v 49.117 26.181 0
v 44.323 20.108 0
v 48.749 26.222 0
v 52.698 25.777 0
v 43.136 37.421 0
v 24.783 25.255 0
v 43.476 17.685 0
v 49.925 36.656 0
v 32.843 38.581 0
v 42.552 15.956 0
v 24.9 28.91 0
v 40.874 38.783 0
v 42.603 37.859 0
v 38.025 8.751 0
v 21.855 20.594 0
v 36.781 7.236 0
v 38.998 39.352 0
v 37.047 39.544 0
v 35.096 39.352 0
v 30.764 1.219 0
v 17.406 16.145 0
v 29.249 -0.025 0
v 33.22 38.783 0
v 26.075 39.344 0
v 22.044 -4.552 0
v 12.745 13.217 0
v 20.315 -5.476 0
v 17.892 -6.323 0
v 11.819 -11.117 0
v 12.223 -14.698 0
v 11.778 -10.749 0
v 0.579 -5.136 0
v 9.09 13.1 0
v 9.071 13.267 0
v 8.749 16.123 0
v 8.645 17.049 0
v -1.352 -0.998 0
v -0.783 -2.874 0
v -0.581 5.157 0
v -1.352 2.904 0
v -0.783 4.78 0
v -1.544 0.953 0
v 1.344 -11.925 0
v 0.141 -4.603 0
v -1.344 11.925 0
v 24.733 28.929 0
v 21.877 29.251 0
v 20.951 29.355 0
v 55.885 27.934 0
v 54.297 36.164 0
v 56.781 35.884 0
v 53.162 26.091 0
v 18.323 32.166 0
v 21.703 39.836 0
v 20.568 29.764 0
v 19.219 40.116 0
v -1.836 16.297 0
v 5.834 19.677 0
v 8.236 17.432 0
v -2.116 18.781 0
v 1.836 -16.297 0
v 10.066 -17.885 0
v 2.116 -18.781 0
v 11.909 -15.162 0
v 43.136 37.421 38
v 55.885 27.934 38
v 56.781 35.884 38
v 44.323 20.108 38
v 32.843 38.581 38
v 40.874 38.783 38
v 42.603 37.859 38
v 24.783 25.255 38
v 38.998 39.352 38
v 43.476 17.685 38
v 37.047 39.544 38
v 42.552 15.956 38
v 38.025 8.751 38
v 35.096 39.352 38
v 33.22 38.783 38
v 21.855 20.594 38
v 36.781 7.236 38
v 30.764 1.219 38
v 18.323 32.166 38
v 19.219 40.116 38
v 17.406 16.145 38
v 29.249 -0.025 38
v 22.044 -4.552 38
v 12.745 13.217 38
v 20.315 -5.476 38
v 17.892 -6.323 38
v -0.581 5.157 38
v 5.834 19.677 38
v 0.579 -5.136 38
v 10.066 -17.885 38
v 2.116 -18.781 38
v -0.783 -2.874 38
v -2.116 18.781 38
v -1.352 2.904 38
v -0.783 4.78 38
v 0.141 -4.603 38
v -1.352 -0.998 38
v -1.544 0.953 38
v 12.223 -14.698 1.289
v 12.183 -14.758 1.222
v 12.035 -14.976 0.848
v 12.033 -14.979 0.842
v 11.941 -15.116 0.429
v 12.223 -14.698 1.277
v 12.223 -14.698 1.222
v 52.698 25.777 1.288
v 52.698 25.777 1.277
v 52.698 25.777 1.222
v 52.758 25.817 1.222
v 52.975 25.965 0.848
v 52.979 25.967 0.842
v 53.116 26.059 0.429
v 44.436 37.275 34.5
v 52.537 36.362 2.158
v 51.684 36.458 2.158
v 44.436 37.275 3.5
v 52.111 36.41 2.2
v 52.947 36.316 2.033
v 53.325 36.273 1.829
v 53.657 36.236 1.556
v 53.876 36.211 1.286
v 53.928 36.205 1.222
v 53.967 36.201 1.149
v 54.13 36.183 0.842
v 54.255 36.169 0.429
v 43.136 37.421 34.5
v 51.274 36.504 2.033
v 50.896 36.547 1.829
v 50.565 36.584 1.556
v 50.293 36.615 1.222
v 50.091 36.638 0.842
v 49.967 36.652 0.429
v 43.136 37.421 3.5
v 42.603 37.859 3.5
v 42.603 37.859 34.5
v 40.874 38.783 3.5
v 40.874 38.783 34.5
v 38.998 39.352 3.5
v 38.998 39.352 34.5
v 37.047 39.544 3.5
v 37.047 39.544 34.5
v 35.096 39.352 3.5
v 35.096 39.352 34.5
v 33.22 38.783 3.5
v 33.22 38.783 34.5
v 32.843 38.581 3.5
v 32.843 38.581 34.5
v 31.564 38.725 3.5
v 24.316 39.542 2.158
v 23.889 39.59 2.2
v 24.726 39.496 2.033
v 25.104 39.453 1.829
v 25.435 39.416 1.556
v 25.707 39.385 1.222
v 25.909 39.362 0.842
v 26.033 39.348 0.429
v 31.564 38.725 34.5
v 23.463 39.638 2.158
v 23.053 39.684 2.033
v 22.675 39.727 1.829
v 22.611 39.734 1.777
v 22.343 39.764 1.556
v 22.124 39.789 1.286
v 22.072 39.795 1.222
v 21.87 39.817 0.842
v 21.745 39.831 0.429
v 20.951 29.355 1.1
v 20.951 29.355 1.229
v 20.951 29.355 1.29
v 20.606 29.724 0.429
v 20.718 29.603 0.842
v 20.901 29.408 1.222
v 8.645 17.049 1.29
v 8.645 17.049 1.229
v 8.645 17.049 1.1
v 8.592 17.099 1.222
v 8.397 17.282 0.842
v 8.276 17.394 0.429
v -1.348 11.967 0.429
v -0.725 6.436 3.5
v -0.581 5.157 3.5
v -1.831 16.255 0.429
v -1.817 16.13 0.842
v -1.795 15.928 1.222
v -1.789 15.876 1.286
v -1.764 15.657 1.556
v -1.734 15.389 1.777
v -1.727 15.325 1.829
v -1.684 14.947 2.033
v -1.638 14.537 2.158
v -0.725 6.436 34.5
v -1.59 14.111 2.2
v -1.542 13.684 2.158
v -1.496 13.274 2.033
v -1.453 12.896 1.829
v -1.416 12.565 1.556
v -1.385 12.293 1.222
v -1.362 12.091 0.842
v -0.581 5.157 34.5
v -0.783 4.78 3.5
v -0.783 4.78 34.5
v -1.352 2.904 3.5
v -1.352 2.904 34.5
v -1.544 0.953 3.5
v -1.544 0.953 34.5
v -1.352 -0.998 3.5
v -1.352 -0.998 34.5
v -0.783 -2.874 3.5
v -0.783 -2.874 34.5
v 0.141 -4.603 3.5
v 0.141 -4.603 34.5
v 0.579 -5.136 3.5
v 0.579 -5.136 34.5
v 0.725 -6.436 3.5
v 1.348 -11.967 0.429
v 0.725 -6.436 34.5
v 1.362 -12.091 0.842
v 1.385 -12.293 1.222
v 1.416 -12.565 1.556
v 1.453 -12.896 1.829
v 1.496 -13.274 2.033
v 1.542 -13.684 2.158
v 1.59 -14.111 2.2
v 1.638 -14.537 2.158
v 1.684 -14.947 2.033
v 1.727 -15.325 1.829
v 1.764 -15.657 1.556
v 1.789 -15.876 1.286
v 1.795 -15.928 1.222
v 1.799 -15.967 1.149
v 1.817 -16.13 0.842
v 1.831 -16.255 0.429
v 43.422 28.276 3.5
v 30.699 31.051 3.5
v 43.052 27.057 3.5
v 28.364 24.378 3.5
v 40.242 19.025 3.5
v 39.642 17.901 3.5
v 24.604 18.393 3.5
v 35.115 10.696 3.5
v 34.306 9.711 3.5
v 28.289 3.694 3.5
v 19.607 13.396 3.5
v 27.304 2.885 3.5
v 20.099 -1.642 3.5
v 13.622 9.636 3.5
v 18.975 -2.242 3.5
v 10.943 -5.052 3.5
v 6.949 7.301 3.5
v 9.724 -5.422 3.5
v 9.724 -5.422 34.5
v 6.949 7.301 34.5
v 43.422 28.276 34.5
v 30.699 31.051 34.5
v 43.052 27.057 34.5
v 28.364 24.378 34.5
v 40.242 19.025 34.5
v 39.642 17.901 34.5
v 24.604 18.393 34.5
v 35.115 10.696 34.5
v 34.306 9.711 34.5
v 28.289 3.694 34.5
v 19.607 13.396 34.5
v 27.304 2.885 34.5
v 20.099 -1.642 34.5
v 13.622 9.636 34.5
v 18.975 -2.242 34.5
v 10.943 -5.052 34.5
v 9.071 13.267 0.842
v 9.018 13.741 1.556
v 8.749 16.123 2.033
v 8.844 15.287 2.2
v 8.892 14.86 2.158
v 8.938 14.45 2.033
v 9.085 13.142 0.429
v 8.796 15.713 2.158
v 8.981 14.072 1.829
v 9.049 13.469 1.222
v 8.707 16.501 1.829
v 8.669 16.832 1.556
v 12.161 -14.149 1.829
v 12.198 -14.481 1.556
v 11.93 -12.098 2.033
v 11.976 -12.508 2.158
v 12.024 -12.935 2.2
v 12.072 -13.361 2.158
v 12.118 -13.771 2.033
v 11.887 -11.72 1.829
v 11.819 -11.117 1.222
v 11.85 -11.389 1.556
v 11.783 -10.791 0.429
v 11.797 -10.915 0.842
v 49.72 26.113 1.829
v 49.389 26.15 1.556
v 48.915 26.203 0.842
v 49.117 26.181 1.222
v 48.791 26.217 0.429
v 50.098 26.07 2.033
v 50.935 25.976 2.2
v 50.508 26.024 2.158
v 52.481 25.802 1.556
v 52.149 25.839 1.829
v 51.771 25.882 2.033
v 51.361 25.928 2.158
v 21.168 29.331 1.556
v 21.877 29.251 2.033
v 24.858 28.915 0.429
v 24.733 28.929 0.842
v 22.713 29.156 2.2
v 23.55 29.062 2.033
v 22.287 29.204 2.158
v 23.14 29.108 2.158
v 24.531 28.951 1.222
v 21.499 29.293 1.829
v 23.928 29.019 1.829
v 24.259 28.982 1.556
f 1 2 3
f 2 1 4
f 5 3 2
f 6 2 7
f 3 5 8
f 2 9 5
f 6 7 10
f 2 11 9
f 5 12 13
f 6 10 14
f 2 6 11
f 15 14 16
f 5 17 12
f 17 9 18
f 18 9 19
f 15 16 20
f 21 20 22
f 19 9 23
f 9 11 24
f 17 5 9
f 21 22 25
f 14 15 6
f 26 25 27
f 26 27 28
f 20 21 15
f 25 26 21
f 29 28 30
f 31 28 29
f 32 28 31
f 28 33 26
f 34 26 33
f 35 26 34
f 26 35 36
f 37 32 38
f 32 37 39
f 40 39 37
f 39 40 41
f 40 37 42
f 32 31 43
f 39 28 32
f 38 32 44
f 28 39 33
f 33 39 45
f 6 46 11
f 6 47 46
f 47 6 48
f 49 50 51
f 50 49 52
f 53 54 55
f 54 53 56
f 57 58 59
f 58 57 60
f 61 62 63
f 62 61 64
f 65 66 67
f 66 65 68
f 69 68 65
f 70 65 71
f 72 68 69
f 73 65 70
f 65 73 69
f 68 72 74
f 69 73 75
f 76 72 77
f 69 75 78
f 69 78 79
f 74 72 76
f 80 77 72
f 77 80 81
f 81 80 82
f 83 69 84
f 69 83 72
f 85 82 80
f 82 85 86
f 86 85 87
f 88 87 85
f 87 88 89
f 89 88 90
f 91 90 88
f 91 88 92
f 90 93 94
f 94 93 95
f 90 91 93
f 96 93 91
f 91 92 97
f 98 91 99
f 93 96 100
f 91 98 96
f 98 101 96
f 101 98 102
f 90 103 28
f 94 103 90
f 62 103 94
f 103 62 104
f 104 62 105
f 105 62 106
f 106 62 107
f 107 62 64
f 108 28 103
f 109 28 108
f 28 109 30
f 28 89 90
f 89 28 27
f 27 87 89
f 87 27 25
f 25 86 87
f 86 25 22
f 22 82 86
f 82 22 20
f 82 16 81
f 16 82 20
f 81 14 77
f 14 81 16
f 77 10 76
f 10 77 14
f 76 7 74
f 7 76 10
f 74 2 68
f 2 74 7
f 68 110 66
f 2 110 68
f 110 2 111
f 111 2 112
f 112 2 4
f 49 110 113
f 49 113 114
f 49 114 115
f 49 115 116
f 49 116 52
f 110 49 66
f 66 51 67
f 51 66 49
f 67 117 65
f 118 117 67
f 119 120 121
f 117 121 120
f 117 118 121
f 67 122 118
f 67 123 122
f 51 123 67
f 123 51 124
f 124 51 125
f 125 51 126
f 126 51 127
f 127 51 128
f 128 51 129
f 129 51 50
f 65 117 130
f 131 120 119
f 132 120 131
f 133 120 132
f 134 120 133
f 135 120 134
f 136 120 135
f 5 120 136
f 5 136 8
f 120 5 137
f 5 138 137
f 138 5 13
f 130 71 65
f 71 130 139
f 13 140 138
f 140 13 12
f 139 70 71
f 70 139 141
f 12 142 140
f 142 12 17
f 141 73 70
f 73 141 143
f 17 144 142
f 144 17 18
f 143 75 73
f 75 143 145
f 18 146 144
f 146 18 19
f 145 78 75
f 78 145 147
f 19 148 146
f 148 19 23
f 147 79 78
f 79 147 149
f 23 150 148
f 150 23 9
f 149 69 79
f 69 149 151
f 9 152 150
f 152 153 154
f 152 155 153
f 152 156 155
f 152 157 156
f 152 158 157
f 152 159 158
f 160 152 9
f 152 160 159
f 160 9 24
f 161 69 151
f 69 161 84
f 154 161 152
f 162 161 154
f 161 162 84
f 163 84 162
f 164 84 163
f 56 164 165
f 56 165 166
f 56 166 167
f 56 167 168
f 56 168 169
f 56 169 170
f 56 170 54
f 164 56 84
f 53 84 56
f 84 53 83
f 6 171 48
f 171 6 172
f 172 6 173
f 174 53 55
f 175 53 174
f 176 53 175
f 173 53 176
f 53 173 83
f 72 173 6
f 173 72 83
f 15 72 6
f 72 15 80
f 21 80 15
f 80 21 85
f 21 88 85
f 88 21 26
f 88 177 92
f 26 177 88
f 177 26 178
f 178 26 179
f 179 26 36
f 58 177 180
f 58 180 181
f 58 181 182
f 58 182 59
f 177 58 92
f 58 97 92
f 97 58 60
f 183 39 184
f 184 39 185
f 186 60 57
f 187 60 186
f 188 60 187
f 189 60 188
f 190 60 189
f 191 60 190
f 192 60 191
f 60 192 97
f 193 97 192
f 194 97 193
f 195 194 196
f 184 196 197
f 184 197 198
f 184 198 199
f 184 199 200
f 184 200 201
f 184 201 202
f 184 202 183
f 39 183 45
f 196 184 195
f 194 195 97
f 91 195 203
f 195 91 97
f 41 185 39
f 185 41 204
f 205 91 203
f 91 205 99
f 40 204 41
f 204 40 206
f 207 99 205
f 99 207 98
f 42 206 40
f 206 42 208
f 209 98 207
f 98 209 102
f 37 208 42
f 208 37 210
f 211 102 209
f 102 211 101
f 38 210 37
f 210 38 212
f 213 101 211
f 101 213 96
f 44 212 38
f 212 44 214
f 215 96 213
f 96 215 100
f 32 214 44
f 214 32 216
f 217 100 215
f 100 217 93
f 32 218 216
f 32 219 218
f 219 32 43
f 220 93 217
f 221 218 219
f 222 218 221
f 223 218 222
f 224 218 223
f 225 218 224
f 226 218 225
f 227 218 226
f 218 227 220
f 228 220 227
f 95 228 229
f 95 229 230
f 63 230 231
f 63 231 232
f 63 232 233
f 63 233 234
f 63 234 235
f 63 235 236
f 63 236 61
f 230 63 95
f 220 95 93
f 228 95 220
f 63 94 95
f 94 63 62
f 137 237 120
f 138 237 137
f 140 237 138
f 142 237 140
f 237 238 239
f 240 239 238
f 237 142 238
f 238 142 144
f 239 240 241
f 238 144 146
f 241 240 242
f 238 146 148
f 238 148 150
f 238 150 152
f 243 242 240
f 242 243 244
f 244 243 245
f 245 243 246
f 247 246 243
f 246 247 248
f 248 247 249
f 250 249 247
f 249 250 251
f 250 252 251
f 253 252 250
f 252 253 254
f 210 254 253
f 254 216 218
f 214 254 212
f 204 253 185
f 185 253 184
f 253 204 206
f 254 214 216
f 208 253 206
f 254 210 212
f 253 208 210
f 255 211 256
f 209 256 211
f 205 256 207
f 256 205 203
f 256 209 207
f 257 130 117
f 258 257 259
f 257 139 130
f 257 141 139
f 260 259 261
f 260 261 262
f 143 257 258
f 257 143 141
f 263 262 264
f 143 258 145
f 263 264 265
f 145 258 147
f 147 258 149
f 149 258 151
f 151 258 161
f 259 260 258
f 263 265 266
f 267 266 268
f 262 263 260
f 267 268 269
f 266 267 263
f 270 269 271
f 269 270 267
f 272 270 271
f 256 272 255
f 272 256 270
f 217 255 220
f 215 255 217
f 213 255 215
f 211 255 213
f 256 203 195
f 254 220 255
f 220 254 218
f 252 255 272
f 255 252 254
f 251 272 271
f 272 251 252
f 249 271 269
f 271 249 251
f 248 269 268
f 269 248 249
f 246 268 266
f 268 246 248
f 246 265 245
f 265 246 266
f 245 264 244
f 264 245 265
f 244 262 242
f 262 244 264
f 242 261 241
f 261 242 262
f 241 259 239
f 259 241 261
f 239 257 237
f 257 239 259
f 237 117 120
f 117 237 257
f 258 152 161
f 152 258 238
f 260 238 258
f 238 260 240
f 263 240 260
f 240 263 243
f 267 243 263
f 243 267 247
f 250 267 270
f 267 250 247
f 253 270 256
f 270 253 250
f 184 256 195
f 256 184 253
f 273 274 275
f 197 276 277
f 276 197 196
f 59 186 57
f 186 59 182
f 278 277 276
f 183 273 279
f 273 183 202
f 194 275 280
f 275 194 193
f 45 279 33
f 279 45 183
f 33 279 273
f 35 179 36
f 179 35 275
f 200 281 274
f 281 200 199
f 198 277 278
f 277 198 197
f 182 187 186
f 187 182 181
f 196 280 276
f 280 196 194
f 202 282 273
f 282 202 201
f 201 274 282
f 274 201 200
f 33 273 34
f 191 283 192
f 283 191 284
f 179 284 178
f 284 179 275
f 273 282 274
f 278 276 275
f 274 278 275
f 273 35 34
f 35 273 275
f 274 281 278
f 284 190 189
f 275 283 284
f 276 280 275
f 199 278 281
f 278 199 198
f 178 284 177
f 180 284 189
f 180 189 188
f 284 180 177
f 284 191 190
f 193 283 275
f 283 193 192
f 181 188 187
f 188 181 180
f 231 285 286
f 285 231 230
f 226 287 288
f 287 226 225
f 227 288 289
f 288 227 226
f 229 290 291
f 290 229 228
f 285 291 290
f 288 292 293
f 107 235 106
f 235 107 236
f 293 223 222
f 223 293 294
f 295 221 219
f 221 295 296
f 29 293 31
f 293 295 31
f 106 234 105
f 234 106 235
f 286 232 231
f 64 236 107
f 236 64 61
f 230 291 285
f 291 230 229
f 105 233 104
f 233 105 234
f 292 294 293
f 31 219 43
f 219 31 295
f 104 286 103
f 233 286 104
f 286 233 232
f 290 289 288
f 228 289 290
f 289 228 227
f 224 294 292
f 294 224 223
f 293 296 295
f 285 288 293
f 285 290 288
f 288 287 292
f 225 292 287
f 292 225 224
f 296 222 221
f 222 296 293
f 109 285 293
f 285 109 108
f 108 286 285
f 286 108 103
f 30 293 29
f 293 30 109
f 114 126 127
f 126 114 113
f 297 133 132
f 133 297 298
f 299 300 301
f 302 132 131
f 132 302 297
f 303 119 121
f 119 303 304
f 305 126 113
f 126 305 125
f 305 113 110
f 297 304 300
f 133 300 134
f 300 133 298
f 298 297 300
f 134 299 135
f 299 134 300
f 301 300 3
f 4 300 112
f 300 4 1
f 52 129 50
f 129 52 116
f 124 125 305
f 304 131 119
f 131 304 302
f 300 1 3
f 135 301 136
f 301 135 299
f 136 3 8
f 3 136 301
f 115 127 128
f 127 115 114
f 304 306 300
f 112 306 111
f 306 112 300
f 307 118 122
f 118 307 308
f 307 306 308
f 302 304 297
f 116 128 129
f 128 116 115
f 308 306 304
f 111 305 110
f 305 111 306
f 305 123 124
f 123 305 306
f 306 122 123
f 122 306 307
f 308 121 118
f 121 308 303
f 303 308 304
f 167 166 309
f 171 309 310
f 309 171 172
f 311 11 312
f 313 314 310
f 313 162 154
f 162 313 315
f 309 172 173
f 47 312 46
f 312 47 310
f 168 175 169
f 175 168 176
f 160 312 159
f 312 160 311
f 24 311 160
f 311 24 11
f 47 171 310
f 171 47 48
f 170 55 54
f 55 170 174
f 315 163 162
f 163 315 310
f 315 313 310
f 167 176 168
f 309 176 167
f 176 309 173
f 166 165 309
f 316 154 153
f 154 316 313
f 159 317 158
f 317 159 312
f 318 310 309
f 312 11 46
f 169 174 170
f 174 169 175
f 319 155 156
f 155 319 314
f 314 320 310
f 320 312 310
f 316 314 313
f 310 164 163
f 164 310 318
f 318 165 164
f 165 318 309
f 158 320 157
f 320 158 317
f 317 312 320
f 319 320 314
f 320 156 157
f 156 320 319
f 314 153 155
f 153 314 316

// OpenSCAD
$fn = 32;

// ----------------------------------------------------------------------
// Air duct: 20 mm duct, 3.5 mm wall, 38 mm across
// ----------------------------------------------------------------------

// --- parameters (mm) ---
duct_r = 10;              // duct core radius
duct_d = 20;              // duct core diameter
wall = 3.5;               // duct wall thickness
height = 38;              // duct width (extrusion height)
port_r = 18.9;            // port flange half width
port_d = 37.8;            // port flange width
port_t = 8;               // port flange thickness
bolt_d = 4.4;             // port bolt holes
bolt_offset = 14.2;       // bolt hole offset from the port axis

difference() {
  /* outer hull chain: tube with a flat flange plate at every port */
  linear_extrude(height = 38) {
    hull() {
      polygon([[2.116, -18.781], [-2.116, 18.781], [5.834, 19.677], [10.066, -17.885]]);
      translate([10.931, 1.232]) circle(r = 10);
    }
    hull() {
      translate([10.931, 1.232]) circle(r = 10);
      translate([8.456, 0.953]) circle(r = 10);
    }
    hull() {
      translate([8.456, 0.953]) circle(r = 10);
      translate([16.488, 3.763]) circle(r = 10);
    }
    hull() {
      translate([16.488, 3.763]) circle(r = 10);
      translate([23.693, 8.29]) circle(r = 10);
    }
    hull() {
      translate([23.693, 8.29]) circle(r = 10);
      translate([29.71, 14.307]) circle(r = 10);
    }
    hull() {
      translate([29.71, 14.307]) circle(r = 10);
      translate([34.237, 21.512]) circle(r = 10);
    }
    hull() {
      translate([34.237, 21.512]) circle(r = 10);
      translate([37.047, 29.544]) circle(r = 10);
    }
    hull() {
      translate([37.047, 29.544]) circle(r = 10);
      translate([36.768, 27.069]) circle(r = 10);
    }
    hull() {
      translate([36.768, 27.069]) circle(r = 10);
      polygon([[19.219, 40.116], [56.781, 35.884], [55.885, 27.934], [18.323, 32.166]]);
    }
  }
  /* air passage: the same chain inset by the wall, 5 mm proud of the ports */
  translate([0, 0, 3.5]) linear_extrude(height = 31) {
    hull() {
      translate([-4.969, -0.56]) circle(r = 6.5);
      translate([8.456, 0.953]) circle(r = 6.5);
    }
    hull() {
      translate([8.456, 0.953]) circle(r = 6.5);
      translate([16.488, 3.763]) circle(r = 6.5);
    }
    hull() {
      translate([16.488, 3.763]) circle(r = 6.5);
      translate([23.693, 8.29]) circle(r = 6.5);
    }
    hull() {
      translate([23.693, 8.29]) circle(r = 6.5);
      translate([29.71, 14.307]) circle(r = 6.5);
    }
    hull() {
      translate([29.71, 14.307]) circle(r = 6.5);
      translate([34.237, 21.512]) circle(r = 6.5);
    }
    hull() {
      translate([34.237, 21.512]) circle(r = 6.5);
      translate([37.047, 29.544]) circle(r = 6.5);
    }
    hull() {
      translate([37.047, 29.544]) circle(r = 6.5);
      translate([38.56, 42.969]) circle(r = 6.5);
    }
  }
  translate([0, 0]) rotate([0, 0, -83.57]) translate([-14.2, -2.5]) rotate([-90, 0, 0]) cylinder(h = 13, d = 4.4);
  translate([0, 0]) rotate([0, 0, -83.57]) translate([14.2, -2.5]) rotate([-90, 0, 0]) cylinder(h = 13, d = 4.4);
  translate([38, 38]) rotate([0, 0, 173.57]) translate([-14.2, -2.5]) rotate([-90, 0, 0]) cylinder(h = 13, d = 4.4);
  translate([38, 38]) rotate([0, 0, 173.57]) translate([14.2, -2.5]) rotate([-90, 0, 0]) cylinder(h = 13, d = 4.4);
}
